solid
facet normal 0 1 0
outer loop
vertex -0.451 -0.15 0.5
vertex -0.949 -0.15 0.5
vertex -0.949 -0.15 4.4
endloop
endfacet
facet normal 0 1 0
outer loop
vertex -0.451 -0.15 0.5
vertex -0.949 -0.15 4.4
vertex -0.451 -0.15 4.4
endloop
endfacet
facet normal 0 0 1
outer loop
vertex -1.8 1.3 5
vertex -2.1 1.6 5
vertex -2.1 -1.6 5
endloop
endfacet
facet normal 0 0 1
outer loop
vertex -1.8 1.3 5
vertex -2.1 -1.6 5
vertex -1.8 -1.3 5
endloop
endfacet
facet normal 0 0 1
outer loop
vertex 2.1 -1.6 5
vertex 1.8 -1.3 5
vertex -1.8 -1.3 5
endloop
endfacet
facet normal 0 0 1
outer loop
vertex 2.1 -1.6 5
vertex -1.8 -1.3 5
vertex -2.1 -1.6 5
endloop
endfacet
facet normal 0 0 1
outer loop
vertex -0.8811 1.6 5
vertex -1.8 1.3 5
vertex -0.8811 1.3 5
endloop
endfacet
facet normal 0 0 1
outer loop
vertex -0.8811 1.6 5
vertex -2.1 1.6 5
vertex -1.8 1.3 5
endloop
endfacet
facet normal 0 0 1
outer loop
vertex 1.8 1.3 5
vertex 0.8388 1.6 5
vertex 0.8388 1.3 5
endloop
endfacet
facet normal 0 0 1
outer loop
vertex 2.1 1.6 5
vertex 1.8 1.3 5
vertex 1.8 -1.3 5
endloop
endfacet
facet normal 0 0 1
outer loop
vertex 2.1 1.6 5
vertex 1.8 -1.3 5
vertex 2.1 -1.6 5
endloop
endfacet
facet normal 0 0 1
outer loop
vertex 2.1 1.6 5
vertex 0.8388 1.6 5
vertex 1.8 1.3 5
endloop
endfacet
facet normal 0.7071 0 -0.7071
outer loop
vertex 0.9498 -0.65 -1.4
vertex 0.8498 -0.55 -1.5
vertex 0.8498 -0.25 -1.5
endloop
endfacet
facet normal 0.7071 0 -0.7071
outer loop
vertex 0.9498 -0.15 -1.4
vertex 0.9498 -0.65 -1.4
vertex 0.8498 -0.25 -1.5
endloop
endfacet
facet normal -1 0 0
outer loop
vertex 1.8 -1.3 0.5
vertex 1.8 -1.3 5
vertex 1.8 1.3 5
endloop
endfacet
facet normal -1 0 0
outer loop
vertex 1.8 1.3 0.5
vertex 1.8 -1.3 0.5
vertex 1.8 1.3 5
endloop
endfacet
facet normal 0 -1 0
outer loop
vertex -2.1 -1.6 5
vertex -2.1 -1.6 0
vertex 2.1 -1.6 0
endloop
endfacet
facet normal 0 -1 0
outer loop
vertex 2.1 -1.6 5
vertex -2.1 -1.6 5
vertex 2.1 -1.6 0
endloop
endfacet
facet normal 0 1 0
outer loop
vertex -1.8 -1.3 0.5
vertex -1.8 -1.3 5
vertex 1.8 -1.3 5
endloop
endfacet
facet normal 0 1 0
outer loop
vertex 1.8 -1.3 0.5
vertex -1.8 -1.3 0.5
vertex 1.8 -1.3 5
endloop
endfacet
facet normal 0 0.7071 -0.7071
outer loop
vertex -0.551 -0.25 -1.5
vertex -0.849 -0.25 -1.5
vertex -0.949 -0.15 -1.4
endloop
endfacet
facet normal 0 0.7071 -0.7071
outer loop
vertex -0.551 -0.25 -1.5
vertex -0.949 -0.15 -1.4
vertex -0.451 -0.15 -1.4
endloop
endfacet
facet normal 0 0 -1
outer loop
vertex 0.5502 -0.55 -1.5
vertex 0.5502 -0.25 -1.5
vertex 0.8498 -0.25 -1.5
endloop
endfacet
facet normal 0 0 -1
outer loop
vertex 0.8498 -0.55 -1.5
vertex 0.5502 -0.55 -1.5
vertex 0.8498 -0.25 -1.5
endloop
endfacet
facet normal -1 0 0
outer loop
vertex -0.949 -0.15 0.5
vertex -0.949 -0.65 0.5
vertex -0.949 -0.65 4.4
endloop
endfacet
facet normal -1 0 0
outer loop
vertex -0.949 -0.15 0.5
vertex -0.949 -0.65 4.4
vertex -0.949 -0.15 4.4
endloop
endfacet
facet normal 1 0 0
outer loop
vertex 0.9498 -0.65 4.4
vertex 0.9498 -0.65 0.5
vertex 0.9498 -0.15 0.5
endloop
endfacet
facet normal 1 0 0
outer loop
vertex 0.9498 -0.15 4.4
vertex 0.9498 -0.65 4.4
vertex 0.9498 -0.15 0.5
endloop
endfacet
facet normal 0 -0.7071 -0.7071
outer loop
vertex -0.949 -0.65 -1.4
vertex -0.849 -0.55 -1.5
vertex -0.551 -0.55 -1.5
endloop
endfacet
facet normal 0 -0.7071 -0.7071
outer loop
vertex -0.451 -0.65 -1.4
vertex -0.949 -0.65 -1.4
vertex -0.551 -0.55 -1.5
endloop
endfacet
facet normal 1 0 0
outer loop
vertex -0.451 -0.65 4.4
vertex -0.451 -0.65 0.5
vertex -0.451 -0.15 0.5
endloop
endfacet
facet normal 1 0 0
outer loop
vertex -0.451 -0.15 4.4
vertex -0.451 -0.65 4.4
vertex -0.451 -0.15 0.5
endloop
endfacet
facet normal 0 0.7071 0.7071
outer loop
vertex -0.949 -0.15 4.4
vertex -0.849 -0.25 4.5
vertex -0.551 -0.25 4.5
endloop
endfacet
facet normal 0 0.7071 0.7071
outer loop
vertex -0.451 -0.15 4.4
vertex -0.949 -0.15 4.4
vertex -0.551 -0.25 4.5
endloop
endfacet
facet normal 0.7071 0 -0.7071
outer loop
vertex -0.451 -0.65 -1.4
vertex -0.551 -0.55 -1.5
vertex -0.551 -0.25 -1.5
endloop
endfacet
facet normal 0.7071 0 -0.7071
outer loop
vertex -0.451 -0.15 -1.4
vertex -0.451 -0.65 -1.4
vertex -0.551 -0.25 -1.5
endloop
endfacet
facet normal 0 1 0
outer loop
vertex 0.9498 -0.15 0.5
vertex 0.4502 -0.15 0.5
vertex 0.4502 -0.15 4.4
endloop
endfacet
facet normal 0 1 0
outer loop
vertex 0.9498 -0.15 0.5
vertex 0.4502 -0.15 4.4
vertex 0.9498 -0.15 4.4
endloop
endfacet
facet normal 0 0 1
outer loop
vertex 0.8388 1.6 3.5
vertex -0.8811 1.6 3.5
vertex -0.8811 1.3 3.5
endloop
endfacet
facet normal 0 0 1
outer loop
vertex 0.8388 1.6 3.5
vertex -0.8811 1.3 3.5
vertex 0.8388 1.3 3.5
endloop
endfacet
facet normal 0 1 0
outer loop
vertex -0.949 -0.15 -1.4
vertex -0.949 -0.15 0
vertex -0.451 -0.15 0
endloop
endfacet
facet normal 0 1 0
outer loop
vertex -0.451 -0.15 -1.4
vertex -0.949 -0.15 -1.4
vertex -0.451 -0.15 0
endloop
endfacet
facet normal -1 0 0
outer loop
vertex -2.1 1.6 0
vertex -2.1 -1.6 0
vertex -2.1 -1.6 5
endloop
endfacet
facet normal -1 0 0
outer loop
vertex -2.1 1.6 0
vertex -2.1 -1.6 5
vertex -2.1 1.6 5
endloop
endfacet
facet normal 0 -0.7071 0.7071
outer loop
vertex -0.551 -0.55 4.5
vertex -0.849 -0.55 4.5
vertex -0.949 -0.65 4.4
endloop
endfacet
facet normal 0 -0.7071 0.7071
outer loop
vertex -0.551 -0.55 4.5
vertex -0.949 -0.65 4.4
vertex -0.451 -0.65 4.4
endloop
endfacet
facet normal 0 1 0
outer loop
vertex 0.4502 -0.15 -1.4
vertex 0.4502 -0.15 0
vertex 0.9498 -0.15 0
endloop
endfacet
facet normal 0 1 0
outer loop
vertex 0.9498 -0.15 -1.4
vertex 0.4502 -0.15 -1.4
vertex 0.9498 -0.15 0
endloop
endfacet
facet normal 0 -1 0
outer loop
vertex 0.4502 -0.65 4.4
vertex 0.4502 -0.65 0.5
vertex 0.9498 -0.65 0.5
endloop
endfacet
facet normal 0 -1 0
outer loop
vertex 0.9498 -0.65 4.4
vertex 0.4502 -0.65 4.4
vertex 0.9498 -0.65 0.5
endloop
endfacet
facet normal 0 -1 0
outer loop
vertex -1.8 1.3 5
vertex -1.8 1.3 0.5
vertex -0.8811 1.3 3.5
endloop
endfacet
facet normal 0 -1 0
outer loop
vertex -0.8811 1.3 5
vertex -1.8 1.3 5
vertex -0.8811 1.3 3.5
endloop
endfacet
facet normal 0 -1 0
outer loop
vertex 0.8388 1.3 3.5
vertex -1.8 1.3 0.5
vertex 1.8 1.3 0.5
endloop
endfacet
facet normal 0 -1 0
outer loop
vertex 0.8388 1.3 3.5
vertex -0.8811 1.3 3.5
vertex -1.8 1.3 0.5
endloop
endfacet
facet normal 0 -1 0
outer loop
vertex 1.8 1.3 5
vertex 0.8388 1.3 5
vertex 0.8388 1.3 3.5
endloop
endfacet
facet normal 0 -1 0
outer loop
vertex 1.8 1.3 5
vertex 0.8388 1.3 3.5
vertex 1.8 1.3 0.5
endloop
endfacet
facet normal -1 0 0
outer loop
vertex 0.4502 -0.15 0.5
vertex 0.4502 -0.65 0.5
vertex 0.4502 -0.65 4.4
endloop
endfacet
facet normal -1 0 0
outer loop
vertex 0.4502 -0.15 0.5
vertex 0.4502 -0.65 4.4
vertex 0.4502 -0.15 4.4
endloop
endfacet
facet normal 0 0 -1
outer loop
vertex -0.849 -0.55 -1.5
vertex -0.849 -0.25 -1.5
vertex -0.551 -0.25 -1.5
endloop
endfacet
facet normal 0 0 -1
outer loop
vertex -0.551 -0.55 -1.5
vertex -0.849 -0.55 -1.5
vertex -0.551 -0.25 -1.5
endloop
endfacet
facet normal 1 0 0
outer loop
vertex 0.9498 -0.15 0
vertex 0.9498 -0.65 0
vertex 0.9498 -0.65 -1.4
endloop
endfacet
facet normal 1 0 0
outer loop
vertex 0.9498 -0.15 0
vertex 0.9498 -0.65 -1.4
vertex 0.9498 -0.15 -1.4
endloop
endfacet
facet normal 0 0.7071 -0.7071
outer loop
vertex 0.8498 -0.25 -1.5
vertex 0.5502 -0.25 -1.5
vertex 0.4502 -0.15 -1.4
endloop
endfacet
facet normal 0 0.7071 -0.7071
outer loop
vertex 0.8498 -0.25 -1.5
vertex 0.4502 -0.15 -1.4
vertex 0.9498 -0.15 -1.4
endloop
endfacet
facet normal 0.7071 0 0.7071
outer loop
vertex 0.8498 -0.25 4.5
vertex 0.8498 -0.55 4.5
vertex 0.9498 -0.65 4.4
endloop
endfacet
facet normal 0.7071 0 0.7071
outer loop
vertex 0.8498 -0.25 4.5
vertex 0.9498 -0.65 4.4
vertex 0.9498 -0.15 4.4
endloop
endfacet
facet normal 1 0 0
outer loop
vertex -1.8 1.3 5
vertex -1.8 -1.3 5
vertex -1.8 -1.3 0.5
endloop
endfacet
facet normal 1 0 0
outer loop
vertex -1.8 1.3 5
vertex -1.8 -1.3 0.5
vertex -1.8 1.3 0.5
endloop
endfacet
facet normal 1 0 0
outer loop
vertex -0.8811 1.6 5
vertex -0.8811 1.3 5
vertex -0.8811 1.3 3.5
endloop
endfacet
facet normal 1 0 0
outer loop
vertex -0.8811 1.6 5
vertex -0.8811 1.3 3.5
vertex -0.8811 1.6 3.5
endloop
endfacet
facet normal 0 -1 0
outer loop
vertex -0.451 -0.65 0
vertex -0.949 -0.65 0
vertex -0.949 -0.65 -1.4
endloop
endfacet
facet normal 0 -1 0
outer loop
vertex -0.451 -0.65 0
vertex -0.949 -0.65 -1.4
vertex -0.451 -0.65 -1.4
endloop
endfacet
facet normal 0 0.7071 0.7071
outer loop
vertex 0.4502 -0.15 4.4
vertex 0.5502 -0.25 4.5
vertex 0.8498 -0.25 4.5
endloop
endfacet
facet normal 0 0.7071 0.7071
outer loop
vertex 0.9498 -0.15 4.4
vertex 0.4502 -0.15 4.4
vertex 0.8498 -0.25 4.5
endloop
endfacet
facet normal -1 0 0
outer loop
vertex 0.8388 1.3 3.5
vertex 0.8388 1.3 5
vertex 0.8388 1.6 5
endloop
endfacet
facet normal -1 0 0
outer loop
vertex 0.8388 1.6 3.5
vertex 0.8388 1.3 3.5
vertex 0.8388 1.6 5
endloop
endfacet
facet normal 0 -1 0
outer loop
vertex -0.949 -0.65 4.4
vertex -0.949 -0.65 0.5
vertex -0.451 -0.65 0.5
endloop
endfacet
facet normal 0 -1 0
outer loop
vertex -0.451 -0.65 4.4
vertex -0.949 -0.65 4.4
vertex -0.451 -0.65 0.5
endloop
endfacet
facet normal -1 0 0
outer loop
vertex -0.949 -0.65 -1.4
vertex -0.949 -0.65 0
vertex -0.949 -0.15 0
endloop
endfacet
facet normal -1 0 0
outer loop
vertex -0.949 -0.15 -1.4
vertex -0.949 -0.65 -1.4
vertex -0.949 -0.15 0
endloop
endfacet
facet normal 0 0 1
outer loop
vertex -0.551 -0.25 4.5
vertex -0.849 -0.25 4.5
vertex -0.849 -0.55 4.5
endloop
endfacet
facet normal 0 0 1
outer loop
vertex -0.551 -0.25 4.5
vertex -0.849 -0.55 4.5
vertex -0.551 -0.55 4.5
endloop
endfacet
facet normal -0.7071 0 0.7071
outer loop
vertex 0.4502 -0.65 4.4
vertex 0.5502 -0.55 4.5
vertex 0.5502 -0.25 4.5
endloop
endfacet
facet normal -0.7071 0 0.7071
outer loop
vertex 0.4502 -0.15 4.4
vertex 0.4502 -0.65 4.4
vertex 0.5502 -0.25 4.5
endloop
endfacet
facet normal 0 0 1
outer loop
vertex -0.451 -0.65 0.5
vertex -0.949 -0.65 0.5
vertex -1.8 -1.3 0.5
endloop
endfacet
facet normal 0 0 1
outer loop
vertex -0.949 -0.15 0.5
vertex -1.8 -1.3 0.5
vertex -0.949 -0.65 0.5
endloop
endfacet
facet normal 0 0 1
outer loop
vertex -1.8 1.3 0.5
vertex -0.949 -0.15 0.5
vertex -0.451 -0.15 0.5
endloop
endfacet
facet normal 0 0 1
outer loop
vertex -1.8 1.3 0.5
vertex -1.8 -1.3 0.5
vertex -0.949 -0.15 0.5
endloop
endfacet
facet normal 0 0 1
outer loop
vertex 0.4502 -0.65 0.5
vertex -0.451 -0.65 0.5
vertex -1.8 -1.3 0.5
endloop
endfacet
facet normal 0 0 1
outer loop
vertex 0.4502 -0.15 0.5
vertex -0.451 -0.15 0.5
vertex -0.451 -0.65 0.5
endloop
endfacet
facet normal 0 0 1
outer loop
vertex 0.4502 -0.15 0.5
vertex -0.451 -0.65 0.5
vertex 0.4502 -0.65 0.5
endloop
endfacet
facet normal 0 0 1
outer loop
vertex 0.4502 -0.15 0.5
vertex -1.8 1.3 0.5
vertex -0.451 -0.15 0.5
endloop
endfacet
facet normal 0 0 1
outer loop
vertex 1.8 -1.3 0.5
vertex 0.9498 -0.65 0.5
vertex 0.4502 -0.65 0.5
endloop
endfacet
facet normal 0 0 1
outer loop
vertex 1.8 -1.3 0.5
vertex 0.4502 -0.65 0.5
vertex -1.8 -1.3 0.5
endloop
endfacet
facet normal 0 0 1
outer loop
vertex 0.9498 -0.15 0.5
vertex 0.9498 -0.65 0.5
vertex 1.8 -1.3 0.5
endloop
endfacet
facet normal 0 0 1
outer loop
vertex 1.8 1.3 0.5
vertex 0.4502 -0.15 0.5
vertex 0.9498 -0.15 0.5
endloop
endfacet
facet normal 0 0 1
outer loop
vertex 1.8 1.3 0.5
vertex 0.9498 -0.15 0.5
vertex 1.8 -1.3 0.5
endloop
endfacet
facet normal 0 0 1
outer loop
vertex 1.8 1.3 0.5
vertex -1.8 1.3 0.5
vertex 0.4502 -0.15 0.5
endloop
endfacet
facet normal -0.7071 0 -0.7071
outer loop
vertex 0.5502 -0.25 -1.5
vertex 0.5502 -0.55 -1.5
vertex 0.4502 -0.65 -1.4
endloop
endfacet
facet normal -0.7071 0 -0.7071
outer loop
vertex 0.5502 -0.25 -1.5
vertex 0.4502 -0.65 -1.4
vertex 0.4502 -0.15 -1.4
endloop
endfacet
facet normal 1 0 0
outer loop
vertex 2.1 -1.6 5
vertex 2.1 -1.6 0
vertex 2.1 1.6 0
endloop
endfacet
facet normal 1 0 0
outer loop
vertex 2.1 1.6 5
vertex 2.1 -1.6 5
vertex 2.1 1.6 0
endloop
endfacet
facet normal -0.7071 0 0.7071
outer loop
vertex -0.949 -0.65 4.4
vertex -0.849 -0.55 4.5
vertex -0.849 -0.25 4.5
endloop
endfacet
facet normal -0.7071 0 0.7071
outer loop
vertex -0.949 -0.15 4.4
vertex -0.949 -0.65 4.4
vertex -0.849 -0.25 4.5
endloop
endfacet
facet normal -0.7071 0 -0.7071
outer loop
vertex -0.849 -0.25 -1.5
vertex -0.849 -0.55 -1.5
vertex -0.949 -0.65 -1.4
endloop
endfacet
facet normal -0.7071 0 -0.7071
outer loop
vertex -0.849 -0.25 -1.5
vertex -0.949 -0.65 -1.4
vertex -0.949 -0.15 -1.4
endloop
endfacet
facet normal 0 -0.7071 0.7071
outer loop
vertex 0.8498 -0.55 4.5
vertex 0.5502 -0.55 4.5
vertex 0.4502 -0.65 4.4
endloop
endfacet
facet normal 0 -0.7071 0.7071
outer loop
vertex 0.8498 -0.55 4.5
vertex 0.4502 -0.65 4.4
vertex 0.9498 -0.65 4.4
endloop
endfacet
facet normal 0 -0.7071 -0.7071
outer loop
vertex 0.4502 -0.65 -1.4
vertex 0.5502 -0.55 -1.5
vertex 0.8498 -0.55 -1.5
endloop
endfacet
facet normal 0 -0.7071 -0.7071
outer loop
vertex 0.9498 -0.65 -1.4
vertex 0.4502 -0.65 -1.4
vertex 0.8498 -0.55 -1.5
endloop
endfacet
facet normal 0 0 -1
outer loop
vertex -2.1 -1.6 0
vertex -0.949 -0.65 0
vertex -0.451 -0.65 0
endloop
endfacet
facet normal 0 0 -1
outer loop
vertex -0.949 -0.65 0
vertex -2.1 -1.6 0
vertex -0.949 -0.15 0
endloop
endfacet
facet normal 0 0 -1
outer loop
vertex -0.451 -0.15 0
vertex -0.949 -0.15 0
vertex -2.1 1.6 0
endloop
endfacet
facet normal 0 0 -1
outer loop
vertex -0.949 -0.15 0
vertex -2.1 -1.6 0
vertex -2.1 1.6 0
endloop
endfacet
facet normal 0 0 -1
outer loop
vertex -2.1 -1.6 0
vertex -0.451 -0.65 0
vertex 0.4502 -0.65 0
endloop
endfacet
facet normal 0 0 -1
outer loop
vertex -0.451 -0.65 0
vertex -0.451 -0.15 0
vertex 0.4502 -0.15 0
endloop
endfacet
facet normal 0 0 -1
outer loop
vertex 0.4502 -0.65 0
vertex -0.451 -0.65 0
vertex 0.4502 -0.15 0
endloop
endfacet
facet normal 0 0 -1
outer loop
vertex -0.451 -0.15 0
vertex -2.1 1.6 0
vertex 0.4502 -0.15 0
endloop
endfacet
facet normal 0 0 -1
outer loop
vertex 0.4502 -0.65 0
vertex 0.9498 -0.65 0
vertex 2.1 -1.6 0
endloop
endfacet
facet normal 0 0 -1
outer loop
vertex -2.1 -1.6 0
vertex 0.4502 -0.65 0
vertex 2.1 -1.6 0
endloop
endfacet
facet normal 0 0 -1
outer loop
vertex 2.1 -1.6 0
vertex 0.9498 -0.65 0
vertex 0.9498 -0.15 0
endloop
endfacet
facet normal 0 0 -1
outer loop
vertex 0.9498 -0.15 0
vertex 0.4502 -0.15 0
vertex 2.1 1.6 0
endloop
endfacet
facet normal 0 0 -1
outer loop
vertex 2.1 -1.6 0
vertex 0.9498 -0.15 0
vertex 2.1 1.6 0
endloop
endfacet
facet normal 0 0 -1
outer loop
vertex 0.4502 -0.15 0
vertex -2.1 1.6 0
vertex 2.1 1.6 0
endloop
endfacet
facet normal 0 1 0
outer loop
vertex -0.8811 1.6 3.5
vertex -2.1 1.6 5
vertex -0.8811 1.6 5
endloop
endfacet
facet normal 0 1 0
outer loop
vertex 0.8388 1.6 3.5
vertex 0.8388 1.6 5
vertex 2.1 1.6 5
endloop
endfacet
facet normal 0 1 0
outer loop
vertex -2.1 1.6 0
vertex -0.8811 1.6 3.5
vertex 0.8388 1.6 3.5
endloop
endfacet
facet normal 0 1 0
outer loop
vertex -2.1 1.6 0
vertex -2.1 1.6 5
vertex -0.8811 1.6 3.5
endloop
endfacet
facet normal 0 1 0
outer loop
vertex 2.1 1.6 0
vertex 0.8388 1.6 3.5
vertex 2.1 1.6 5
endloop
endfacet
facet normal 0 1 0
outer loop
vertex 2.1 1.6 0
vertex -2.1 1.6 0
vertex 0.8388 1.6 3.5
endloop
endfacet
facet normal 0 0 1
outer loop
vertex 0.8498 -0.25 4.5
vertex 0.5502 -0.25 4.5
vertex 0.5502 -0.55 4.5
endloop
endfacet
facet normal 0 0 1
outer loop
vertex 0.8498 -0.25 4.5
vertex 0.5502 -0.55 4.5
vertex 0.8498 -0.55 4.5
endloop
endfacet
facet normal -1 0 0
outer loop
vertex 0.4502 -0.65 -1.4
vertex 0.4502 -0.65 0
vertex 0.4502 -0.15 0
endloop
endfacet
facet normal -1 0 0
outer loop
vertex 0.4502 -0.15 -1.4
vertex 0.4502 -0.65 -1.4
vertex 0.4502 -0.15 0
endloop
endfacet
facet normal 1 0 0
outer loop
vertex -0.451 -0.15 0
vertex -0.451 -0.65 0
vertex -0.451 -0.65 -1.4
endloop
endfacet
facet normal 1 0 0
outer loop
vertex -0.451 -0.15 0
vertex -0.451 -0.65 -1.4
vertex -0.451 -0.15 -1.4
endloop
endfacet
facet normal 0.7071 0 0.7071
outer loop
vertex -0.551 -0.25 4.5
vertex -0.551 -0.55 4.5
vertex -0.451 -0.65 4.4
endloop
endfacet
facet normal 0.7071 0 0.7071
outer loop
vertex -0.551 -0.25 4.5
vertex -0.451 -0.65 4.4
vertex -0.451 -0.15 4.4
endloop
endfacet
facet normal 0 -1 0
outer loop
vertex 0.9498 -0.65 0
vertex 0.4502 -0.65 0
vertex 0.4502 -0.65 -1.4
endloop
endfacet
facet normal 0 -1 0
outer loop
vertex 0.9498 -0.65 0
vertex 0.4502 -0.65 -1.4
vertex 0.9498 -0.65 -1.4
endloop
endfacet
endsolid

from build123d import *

# Parameters (mm, degrees)
SKETCH_1_W           = 4.2
SKETCH_1_H           = 3.2
EXTRUDE_1_DEPTH      = 5
SKETCH_2_W           = 3.6
SKETCH_2_H           = 2.6
CUT_EXTRUDE_2_DEPTH  = 4.5
SKETCH_10_W          = 1.719860591
SKETCH_10_H          = 0.3
CUT_EXTRUDE_6_DEPTH  = 1.5
SKETCH_12_W          = 0.497980778
SKETCH_12_H          = 0.499968878
SKETCH_12_W_2        = 0.49954636
EXTRUDE_2_DEPTH      = 4
EXTRUDE_2_DEPTH_BACK = 2
CHAMFER_2_SIZE       = 0.1
CHAMFER_3_SIZE       = 0.1


with BuildPart() as part:
    # 草图1 → 凸台-拉伸1 (new body)
    with BuildSketch(Plane.XY):
        Rectangle(SKETCH_1_W, SKETCH_1_H)
    extrude(amount=EXTRUDE_1_DEPTH)

    # 草图2 → 切除-拉伸2 (cut)
    with BuildSketch(Plane.XY.offset(5)):
        Rectangle(SKETCH_2_W, SKETCH_2_H)
    extrude(amount=-CUT_EXTRUDE_2_DEPTH, mode=Mode.SUBTRACT)

    # 草图10 → 切除-拉伸6 (cut)
    with BuildSketch(Plane.XY.offset(5)):
        with Locations((-0.021149262, 1.45)):
            Rectangle(SKETCH_10_W, SKETCH_10_H)
    extrude(amount=-CUT_EXTRUDE_6_DEPTH, mode=Mode.SUBTRACT)

    # 草图12 → 凸台-拉伸2 (add, two sides)
    with BuildSketch(Plane.XY.offset(0.5)) as extrude_2_sk:
        with Locations((-0.7, -0.4)):
            Rectangle(SKETCH_12_W, SKETCH_12_H)
        with Locations((0.7, -0.4)):
            Rectangle(SKETCH_12_W_2, SKETCH_12_H)
    extrude(amount=EXTRUDE_2_DEPTH)
    extrude(extrude_2_sk.sketch, amount=-EXTRUDE_2_DEPTH_BACK)

    # 倒角2
    chamfer_2_edges = [part.edges().sort_by_distance(p)[0] for p in [
        (-0.451009611, -0.4, 4.5),
        (-0.7, -0.150015561, 4.5),
        (-0.948990389, -0.4, 4.5),
        (-0.7, -0.649984439, 4.5),
        (0.94977318, -0.4, 4.5),
        (0.7, -0.150015561, 4.5),
        (0.45022682, -0.4, 4.5),
        (0.7, -0.649984439, 4.5),
    ]]
    chamfer(chamfer_2_edges, length=CHAMFER_2_SIZE)

    # 倒角3
    chamfer_3_edges = [part.edges().sort_by_distance(p)[0] for p in [
        (-0.451009611, -0.4, -1.5),
        (-0.7, -0.649984439, -1.5),
        (-0.948990389, -0.4, -1.5),
        (-0.7, -0.150015561, -1.5),
        (0.94977318, -0.4, -1.5),
        (0.7, -0.649984439, -1.5),
        (0.45022682, -0.4, -1.5),
        (0.7, -0.150015561, -1.5),
    ]]
    chamfer(chamfer_3_edges, length=CHAMFER_3_SIZE)


solid = part.part
